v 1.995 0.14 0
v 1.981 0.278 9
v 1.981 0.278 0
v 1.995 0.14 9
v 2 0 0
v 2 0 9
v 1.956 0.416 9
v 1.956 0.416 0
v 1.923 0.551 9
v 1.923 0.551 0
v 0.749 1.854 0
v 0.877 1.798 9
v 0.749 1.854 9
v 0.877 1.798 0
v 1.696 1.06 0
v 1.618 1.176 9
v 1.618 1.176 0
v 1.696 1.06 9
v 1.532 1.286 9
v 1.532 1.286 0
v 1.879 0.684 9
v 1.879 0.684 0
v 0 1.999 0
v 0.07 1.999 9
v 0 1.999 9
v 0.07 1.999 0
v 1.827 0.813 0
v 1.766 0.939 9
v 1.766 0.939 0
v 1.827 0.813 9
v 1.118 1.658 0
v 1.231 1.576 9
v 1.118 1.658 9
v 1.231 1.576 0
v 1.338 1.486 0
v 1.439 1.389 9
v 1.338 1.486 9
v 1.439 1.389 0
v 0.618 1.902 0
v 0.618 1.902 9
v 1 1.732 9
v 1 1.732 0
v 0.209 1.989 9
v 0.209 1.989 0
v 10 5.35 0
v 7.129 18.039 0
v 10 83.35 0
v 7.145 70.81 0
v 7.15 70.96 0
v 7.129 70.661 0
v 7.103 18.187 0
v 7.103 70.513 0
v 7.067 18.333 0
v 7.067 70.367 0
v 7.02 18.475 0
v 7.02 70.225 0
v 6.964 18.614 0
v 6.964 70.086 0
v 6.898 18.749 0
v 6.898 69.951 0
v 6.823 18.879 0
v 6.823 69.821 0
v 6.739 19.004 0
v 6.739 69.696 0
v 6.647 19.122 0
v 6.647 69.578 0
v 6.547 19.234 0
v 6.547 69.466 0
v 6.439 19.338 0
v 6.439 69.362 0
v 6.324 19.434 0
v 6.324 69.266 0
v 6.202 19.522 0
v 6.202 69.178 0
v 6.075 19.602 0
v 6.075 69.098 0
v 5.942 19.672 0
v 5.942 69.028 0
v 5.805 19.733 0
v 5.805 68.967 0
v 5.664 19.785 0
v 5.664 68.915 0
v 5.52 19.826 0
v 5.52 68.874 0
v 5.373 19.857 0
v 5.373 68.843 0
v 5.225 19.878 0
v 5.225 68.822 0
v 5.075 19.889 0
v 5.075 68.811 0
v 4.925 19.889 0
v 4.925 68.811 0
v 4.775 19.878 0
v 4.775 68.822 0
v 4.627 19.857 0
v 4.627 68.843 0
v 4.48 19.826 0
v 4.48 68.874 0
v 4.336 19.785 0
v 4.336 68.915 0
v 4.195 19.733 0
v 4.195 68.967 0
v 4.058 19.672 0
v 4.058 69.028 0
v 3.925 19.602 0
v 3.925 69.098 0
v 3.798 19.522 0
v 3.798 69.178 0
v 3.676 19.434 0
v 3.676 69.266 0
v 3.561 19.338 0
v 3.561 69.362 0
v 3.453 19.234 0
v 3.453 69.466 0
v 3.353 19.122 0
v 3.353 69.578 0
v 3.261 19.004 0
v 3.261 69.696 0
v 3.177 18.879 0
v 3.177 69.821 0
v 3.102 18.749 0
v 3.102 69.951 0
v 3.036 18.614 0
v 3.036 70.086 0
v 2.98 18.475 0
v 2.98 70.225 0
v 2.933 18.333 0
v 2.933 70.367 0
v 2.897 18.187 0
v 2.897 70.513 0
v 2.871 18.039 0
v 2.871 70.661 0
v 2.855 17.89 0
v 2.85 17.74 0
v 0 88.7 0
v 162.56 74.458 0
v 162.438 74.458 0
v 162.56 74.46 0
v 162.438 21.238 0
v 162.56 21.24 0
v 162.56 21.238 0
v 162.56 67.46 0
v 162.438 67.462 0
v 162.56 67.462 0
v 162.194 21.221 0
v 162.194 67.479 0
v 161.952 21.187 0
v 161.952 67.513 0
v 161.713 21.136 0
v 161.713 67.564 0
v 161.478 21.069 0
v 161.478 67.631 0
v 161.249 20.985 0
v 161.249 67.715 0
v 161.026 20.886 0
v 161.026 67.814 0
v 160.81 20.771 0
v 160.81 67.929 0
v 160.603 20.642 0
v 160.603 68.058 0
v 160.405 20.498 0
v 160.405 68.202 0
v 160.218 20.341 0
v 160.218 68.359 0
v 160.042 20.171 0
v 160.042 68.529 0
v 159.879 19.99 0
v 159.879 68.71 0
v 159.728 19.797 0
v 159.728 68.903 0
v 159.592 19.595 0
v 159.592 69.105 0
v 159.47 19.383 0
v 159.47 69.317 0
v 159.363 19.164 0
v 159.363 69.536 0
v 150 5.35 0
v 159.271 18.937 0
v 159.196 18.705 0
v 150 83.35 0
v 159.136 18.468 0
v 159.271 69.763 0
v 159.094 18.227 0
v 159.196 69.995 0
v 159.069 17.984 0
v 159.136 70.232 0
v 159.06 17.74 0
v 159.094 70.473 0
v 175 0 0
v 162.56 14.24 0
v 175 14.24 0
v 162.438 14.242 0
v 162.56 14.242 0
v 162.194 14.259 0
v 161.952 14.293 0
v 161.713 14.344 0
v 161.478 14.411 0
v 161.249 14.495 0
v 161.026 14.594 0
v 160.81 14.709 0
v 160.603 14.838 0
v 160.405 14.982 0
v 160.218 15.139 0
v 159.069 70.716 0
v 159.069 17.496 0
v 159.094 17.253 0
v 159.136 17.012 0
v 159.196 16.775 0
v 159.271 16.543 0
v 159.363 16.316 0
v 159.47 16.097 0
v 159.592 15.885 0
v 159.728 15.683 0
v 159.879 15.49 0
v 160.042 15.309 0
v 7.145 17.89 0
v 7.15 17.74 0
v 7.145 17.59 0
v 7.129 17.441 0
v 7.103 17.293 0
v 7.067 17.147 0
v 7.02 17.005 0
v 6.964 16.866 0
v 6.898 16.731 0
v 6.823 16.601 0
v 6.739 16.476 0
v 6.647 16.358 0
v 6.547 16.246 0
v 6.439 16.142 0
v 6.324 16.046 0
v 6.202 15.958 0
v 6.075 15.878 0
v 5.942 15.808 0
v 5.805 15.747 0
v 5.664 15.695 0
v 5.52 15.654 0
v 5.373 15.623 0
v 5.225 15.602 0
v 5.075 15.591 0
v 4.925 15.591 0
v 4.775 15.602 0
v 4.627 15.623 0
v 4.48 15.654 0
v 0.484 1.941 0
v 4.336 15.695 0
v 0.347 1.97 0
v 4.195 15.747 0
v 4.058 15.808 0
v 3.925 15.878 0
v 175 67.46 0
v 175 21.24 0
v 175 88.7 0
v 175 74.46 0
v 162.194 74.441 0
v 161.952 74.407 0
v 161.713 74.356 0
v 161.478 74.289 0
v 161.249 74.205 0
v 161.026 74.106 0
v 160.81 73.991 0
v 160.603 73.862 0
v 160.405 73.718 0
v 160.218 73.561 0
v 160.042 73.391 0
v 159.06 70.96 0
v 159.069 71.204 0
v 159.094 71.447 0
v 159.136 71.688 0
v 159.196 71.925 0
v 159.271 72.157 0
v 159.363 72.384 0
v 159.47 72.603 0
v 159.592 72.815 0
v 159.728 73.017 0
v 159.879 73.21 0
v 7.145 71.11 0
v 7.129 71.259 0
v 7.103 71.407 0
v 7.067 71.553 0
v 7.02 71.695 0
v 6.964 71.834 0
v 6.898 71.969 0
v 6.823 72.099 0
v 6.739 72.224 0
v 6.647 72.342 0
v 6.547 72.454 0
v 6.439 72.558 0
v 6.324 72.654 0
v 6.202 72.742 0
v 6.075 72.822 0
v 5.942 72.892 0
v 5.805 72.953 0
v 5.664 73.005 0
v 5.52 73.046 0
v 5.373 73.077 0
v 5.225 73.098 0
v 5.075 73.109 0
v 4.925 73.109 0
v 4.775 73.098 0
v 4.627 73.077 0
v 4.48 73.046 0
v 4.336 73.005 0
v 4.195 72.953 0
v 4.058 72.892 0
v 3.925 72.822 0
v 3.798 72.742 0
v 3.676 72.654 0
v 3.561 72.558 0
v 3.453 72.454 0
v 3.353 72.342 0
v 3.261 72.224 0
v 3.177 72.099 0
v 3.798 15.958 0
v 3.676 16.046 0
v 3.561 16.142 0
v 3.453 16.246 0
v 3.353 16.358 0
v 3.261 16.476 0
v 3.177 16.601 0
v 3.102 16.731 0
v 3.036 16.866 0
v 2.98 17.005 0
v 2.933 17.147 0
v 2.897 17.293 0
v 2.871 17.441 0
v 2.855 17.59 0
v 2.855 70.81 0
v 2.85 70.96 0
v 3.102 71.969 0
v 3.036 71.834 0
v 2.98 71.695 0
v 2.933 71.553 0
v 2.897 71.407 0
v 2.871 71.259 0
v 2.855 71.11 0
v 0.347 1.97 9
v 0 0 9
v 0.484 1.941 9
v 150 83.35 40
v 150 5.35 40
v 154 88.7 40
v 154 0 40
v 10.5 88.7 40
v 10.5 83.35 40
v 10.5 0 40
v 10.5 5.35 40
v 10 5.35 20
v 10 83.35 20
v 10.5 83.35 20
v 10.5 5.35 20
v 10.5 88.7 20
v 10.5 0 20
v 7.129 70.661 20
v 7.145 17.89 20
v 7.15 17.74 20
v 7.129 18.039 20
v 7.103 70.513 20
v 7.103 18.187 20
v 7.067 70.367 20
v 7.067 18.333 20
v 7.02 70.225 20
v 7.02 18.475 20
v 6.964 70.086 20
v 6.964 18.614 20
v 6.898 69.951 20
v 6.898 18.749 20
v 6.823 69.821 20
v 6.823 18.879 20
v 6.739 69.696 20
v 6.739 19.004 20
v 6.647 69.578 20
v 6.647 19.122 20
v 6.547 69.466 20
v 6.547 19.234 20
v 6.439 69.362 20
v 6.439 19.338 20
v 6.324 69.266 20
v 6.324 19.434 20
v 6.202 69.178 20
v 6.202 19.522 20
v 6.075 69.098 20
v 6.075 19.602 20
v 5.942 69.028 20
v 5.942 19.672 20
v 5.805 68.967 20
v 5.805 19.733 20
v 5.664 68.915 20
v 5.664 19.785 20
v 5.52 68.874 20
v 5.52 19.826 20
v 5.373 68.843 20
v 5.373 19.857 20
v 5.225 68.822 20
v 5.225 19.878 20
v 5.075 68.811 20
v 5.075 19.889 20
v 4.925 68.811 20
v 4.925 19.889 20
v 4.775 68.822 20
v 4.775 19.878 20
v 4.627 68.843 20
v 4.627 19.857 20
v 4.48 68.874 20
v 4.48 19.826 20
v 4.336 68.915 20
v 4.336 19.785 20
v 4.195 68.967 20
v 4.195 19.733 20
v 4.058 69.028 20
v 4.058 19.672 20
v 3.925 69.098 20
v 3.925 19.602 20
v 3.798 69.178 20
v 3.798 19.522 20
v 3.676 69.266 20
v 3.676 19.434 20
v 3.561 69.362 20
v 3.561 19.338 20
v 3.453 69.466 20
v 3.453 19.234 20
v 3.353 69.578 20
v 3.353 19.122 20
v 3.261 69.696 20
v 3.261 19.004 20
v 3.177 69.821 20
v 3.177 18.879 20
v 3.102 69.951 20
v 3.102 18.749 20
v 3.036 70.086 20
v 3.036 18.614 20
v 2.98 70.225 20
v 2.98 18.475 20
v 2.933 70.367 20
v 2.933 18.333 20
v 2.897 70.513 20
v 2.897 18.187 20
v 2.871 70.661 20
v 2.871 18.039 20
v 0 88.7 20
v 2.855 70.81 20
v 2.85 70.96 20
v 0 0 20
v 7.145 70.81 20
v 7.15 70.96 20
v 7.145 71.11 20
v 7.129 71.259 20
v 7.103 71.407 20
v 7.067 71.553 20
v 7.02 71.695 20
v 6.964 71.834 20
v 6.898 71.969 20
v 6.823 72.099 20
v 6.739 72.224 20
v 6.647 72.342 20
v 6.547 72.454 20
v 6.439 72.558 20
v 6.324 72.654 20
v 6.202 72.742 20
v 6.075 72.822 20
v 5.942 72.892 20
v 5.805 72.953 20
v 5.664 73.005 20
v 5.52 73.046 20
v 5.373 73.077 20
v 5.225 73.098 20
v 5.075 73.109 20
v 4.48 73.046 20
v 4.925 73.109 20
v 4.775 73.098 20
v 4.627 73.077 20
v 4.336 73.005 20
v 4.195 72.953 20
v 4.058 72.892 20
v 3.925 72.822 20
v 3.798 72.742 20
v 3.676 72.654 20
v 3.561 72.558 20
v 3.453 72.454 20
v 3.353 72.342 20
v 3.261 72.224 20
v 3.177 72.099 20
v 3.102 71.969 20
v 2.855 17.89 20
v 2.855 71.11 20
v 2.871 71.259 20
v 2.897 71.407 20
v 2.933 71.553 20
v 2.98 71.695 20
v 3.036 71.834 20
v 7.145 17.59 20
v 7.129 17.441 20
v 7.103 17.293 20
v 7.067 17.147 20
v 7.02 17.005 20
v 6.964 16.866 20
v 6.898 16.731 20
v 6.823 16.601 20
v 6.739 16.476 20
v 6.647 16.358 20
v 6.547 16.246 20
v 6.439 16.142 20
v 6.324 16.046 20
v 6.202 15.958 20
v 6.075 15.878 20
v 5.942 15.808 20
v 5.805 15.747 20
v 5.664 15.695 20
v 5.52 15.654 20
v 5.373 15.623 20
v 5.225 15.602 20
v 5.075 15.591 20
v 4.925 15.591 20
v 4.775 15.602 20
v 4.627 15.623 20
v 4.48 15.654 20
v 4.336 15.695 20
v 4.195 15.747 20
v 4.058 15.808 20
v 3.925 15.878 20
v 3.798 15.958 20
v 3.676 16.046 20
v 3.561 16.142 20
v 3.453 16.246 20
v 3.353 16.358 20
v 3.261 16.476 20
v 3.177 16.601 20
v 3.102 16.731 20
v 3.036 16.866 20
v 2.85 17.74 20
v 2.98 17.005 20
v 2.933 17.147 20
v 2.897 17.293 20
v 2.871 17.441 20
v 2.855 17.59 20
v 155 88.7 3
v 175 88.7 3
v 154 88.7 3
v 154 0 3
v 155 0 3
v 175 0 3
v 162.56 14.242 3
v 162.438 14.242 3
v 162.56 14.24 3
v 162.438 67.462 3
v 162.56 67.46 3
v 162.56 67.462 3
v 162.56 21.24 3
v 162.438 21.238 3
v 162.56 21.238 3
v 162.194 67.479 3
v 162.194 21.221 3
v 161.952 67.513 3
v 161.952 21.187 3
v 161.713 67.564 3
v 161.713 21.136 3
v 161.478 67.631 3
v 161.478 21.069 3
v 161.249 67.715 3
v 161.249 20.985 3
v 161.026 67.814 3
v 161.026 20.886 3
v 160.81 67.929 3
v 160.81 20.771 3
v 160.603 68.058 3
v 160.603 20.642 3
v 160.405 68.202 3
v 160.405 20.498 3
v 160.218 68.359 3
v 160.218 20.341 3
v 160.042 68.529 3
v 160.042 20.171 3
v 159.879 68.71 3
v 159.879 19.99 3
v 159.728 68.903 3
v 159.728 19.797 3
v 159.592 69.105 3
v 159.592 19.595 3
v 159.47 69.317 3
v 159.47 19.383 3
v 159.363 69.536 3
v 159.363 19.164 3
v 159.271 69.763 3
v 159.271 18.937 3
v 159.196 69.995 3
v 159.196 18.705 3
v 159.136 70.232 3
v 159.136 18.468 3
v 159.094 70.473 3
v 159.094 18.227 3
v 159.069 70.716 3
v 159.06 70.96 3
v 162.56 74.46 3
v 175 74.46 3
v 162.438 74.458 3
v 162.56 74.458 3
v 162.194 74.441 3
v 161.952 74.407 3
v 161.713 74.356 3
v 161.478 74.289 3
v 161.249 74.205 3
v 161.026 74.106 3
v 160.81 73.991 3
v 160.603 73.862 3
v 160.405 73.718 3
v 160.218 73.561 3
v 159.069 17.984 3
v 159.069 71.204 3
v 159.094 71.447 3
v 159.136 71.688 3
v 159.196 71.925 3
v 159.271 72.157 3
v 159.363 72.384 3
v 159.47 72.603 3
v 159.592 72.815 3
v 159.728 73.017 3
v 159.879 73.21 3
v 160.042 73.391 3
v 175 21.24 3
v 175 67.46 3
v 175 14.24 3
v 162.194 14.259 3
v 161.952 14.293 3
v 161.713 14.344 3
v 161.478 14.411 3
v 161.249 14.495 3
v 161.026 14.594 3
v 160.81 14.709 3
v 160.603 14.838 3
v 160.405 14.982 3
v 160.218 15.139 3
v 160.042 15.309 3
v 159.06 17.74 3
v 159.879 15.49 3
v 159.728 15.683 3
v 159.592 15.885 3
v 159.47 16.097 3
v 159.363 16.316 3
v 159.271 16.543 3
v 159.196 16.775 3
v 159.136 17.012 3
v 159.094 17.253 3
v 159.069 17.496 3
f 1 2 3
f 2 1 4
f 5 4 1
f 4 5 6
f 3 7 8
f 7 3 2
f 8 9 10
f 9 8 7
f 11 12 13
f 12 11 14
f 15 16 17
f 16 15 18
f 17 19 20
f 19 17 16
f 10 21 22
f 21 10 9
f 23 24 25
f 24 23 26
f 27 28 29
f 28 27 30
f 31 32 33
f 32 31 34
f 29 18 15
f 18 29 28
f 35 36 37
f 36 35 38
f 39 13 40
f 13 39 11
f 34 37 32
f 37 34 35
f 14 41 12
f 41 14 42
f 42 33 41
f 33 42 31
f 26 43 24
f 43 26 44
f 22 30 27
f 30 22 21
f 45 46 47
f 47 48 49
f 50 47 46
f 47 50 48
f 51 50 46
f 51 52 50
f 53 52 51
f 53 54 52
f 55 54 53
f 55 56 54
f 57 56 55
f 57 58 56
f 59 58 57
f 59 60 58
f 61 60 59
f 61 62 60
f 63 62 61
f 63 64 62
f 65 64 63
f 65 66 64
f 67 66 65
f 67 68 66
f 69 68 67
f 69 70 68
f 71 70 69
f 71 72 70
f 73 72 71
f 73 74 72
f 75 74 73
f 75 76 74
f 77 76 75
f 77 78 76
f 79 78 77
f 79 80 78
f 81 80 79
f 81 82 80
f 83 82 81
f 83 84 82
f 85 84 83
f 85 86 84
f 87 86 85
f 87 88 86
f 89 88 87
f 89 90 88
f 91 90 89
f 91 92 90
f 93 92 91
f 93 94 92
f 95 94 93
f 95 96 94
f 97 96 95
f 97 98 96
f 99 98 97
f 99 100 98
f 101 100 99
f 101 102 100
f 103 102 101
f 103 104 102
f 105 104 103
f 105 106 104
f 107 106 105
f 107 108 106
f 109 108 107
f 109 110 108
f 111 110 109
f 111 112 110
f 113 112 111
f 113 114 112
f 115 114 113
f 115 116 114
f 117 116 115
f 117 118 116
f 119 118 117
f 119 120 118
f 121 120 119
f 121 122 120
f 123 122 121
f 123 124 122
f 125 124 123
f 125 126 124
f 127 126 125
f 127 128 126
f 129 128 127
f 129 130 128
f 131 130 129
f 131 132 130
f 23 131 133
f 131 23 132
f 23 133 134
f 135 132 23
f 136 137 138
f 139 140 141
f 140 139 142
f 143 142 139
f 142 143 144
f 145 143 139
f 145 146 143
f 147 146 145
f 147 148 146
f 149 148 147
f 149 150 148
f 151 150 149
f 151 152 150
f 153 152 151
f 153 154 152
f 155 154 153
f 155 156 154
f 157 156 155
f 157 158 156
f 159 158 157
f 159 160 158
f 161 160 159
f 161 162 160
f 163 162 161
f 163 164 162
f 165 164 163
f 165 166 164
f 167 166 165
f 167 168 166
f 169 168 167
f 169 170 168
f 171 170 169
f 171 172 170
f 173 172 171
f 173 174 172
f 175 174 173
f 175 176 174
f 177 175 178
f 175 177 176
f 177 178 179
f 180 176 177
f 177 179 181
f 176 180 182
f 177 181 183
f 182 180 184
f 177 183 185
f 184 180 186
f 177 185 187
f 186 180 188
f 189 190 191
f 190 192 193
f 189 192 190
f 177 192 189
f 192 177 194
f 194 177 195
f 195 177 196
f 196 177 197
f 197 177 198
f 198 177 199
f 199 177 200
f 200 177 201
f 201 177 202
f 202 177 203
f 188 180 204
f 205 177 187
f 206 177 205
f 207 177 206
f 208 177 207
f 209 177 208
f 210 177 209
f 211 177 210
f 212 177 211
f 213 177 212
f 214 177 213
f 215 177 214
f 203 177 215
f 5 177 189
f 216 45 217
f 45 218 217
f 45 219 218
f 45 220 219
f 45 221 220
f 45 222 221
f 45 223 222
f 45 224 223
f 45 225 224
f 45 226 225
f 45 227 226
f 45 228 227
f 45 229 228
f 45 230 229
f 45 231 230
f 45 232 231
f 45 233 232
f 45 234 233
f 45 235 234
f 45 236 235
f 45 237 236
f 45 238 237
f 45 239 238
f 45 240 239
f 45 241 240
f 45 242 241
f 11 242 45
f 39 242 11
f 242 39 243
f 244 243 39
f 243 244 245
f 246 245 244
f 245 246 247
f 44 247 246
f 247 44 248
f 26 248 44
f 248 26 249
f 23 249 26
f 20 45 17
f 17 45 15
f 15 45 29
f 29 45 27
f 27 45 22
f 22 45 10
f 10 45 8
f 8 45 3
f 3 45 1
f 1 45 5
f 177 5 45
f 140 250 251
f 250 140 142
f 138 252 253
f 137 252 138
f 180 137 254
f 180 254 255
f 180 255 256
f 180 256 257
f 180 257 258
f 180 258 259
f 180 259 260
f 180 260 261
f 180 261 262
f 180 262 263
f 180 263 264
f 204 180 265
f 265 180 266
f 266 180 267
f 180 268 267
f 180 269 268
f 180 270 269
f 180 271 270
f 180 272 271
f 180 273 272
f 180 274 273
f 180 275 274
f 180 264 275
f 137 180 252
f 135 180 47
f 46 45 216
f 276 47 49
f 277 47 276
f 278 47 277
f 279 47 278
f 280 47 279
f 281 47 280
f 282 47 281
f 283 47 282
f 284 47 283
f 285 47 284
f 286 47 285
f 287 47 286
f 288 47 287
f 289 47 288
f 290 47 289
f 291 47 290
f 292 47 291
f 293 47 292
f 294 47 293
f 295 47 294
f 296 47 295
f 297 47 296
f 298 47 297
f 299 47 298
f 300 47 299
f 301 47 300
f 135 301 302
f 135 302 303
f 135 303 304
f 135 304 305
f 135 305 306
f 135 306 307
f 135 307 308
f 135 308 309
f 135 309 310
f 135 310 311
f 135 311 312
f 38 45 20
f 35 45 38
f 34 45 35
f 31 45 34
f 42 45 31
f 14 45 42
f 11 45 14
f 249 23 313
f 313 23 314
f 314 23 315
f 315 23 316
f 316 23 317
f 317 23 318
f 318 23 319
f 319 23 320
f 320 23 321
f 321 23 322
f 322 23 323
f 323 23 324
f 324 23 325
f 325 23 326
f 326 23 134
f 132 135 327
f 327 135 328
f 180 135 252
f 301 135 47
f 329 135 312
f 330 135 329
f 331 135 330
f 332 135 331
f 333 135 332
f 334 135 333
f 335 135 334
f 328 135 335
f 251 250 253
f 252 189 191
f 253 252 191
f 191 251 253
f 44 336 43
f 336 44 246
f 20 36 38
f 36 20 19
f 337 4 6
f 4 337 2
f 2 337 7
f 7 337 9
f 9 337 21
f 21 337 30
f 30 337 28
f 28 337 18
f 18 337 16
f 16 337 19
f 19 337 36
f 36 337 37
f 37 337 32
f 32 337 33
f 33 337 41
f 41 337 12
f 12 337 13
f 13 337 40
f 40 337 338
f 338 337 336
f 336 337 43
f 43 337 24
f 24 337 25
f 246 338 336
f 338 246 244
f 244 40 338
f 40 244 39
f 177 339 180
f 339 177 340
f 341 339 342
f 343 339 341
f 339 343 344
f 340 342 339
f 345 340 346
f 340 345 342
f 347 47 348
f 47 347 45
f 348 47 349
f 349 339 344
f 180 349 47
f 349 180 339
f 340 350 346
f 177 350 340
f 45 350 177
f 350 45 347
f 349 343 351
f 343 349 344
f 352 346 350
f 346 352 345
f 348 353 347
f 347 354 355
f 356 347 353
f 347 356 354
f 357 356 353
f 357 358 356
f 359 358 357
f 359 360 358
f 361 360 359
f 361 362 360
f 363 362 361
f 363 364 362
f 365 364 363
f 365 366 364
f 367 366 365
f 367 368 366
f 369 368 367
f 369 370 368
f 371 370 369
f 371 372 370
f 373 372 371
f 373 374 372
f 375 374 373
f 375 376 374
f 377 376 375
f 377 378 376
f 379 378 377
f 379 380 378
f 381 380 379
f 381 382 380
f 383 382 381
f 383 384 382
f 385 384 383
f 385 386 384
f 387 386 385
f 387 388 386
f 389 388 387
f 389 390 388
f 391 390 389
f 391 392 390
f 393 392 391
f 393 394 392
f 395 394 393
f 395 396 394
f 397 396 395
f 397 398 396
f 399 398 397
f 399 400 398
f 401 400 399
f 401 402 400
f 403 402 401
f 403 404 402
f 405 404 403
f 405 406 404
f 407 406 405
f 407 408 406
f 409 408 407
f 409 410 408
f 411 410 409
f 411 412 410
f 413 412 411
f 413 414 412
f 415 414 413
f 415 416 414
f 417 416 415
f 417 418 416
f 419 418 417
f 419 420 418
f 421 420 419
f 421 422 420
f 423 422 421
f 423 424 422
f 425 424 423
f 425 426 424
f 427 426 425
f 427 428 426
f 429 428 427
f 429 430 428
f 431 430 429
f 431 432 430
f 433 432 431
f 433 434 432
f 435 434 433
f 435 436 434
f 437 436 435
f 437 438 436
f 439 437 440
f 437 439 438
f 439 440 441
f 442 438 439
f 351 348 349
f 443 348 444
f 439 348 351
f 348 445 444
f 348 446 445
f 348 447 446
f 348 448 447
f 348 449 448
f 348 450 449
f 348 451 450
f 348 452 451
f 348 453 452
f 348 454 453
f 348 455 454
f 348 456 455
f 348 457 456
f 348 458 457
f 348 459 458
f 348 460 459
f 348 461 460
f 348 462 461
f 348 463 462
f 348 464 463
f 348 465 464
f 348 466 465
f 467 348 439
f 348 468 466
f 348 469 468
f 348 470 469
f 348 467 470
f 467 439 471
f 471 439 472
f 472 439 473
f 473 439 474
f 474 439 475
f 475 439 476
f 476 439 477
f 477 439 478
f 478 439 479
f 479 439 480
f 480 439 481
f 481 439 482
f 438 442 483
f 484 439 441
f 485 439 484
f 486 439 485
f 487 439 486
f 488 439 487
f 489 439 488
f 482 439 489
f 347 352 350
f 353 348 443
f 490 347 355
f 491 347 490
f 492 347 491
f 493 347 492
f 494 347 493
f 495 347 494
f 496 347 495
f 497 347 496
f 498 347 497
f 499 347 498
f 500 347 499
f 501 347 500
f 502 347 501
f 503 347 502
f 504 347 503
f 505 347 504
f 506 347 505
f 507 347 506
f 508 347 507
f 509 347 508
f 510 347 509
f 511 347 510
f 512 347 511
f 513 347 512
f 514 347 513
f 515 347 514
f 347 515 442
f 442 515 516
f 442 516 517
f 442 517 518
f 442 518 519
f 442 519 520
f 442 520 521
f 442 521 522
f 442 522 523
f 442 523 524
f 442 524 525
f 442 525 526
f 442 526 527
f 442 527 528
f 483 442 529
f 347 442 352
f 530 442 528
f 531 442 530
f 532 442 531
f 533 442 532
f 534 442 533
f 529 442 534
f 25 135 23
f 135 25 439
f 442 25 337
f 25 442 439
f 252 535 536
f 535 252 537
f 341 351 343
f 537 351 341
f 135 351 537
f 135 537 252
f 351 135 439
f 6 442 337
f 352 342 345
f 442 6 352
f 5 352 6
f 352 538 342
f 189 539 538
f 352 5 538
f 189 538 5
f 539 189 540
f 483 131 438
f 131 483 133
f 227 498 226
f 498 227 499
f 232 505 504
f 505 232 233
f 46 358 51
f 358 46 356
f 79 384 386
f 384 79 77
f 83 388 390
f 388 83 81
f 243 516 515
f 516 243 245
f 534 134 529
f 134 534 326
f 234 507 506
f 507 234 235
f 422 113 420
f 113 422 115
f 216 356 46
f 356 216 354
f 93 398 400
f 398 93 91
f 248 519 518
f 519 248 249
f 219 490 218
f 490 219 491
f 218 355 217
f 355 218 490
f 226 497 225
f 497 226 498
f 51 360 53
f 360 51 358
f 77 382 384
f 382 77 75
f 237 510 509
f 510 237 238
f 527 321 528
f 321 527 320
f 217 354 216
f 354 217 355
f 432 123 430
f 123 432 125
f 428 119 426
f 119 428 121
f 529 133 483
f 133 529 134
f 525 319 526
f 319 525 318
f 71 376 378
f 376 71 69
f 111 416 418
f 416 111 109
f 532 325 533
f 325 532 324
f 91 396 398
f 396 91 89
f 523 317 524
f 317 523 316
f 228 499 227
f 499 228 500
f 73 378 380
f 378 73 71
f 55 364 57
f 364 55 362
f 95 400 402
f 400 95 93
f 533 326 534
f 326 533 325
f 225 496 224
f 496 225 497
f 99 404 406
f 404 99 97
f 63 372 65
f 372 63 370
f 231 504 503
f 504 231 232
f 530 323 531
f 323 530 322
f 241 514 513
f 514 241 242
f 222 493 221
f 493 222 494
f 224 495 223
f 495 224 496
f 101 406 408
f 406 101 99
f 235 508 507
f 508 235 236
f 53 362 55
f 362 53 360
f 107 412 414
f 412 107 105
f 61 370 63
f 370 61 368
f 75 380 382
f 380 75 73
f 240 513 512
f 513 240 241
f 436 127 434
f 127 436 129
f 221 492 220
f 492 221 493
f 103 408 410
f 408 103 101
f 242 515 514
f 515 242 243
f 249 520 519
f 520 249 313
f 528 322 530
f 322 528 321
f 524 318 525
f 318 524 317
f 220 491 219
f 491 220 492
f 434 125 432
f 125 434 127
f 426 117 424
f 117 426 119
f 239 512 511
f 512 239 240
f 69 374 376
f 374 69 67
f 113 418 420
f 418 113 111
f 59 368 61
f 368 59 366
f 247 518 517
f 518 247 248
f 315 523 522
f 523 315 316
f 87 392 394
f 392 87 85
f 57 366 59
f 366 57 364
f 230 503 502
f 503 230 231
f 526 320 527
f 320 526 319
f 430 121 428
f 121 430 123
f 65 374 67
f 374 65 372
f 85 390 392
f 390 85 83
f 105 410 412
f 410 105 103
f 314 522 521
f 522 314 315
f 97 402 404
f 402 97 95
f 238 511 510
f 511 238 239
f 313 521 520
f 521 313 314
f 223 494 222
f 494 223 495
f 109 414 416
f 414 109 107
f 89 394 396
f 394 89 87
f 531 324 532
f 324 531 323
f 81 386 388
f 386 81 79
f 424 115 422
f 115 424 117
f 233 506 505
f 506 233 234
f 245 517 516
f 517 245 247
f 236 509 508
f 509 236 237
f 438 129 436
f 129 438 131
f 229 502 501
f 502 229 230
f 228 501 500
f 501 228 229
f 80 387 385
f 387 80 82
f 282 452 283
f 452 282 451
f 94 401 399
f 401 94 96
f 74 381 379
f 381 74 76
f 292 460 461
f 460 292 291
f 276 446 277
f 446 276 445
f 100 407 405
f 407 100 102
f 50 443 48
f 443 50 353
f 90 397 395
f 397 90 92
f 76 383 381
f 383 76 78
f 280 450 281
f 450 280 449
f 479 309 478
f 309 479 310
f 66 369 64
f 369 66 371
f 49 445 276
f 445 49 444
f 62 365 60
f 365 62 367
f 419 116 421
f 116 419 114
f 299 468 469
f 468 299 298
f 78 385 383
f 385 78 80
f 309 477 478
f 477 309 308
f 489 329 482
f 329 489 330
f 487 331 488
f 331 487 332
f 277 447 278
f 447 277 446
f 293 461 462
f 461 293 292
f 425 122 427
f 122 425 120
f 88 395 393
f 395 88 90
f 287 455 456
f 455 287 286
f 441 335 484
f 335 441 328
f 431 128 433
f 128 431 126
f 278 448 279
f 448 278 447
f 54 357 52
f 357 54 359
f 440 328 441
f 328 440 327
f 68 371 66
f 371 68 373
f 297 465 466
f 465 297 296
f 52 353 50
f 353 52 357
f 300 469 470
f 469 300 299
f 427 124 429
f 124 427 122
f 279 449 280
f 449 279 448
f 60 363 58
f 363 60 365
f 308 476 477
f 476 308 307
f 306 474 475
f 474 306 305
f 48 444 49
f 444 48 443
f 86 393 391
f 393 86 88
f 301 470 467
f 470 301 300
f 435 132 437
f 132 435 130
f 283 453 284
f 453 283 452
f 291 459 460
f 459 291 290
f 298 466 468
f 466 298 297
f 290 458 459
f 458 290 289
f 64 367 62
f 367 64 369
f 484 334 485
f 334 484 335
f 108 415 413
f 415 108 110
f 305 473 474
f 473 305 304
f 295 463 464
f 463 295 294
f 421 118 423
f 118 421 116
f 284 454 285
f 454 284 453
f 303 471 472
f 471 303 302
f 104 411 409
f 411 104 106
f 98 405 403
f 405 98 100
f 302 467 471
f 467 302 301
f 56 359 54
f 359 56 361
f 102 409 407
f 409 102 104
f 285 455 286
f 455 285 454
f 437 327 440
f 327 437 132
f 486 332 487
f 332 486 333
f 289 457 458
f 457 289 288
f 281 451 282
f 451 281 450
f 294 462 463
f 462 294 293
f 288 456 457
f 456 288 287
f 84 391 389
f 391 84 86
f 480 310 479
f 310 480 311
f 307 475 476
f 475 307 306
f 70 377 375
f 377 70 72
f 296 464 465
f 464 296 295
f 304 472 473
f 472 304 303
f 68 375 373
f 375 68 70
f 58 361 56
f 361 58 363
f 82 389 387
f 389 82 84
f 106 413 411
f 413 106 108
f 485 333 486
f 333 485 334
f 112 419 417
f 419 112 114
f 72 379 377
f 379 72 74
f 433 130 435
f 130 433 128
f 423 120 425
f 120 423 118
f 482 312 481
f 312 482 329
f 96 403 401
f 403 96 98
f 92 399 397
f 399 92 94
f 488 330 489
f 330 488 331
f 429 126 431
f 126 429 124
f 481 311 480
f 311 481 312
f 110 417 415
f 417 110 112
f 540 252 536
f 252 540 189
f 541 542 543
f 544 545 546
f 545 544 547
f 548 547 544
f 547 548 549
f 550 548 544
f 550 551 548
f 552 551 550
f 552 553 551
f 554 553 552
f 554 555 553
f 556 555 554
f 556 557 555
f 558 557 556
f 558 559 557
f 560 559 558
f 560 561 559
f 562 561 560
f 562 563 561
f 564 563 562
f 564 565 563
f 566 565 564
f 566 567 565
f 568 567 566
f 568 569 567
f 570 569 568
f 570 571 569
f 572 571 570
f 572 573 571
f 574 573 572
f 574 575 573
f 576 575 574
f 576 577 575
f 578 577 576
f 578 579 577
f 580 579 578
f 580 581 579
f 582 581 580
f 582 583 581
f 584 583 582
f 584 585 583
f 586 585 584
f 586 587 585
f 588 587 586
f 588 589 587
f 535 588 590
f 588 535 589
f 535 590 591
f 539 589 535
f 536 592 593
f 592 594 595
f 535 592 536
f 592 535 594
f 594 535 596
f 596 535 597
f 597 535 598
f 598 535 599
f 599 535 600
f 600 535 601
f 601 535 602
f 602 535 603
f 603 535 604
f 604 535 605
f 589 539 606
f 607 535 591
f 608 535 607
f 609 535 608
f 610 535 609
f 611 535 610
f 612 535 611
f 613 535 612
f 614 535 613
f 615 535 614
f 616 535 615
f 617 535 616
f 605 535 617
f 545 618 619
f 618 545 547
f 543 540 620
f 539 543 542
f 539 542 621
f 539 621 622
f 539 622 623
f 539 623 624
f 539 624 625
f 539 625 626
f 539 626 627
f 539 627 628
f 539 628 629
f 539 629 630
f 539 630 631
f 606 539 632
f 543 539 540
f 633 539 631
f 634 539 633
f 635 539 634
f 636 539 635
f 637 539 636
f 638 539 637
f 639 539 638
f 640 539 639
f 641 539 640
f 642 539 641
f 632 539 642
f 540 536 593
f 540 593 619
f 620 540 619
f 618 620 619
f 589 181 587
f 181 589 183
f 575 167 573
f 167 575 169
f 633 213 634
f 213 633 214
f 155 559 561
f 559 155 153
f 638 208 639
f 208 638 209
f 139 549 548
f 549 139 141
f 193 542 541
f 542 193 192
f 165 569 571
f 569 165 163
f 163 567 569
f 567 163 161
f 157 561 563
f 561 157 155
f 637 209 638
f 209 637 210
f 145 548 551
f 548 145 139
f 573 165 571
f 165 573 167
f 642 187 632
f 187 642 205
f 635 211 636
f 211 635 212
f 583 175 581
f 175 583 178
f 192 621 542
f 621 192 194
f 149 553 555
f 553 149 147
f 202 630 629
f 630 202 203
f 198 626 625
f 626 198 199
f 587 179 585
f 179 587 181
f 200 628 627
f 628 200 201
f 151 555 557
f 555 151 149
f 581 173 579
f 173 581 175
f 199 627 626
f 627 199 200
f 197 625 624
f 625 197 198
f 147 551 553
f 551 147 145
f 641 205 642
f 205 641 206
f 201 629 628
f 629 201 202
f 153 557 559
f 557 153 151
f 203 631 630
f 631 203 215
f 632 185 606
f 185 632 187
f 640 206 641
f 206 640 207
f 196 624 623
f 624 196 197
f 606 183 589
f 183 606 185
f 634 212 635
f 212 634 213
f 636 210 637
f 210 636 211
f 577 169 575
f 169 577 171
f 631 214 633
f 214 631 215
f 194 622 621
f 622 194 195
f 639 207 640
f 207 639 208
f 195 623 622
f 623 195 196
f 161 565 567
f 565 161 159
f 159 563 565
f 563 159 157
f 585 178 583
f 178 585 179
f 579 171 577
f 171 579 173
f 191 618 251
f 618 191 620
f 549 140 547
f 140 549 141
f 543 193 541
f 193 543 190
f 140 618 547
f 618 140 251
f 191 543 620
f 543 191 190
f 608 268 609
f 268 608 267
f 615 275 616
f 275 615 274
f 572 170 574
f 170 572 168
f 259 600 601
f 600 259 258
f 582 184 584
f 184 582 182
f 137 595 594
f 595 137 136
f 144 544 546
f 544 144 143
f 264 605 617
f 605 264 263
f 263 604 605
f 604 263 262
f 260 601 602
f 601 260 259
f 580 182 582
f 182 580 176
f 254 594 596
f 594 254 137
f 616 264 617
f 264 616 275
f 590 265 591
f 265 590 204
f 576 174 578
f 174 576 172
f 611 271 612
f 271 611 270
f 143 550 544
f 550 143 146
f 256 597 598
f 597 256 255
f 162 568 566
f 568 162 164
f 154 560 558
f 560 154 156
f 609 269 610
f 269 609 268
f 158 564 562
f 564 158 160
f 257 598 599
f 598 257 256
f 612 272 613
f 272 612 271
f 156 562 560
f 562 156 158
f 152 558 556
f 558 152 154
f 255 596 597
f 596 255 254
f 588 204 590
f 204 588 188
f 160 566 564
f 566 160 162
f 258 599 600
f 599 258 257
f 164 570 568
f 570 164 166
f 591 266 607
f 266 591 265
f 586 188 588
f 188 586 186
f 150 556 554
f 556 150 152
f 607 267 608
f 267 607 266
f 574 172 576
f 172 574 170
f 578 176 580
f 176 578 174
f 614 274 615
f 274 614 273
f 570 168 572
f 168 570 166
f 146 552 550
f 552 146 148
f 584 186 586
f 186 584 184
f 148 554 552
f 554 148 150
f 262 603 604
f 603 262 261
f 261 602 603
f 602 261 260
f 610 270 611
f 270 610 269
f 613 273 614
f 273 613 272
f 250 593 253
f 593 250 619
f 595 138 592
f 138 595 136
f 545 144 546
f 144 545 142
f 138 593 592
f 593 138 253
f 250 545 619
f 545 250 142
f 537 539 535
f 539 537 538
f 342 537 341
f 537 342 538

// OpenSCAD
// file: ../utils/server-rack-node-case/case-generic.scad
/* caseGeneric
    Used by `caseSide` and `caseMiddle` to generate 
    a basic case with monting holes, e.g., for ssd or Pi.

    cwi: case width inner
    cwo: case width outer
    chi: case height inner
    cho: case height outer
    cdt: case depth thickenss
    npc: node per case
    dbnh: distance between node holes
    isSide: 
*/
module caseGeneric(cwi,cwo,chi,cho,cdt,npc,dbnh, isSide=true){
    nt = cwi/npc;  // Node thicknes

    hwt = (cho-chi)/2; // horizontal wall thickness
    vwt = (cwo-cwi)/2; // vertical wall thickness
    vwtt = vwt*2; // vertical wall thickness total
    cwt = cwo+vwt*2; // case width total
    dnmh = 4; // diameter node mounting hole
    hnmh = 9; // height node mounting hole
    dcmh = 4.3; // diameter case mounting hole
    mcc = 0.5; // margin for connecting cases

    module nodeMountingHoles(){
        for(i=[1:2:npc*2]){
            // Buttom holes
            translate([vwtt+(nt/2)*i,(cho-dbnh)/2,0])
            cylinder(d=dnmh, h=hnmh);

            // Top holes 
            translate([vwtt+(nt/2)*i,(cho+dbnh)/2,0])
            cylinder(d=dnmh, h=hnmh);
        }
    }
    
    difference(){
        union(){
            if (isSide)
            {
              cube([cwt-vwt,cho,cdt]);
            }
            else
            {
              cube([cwt,cho,cdt]);
            }
        }
        union(){
            // Inner cutout
            translate([vwtt,hwt,0])
            cube([cwi,chi,cdt]);
            
            // Cutout for connecting cases
            translate([0,0,cdt/2])
            cube([vwtt+mcc,cho,cdt/2]);

            translate([vwt,cho/5,0])
            cylinder(d=dcmh, h=cdt);
            translate([vwt,cho/5*4,0])
            cylinder(d=dcmh, h=cdt);

            if (isSide)
            {
                nodeMountingHoles();
            }
            else
            {
                translate([0,0,cdt-hnmh])
                nodeMountingHoles();

                translate([cwo-mcc,0,cdt/2])
                cube([vwtt+mcc,cho,cdt/2]);

                translate([cwt-vwt,cho/5,0])
                cylinder(d=dcmh, h=cdt);
                translate([cwt-vwt,cho/5*4,0])
                cylinder(d=dcmh, h=cdt);
            }
        }
    }
}
// file: ../utils/server-rack-node-case/case-side.scad
use <case-generic.scad>;

/* caseSide
    case with have rack mounts. One on eatch side

    cwi: case width inner
    cwo: case width outer
    chi: case height inner
    cho: case height outer
    cdt: case depth thickenss
    npc: node per case
*/
module caseSide(cwi,cwo,chi,cho,cdt,npc){
    cst = (cwo-cwi)/2; // case side thickness
    csw = 20; // case side mount width
    csmt = 3; // case side mount thickness
    dfcetmh = 7.56; // distance from case end to mounting hole
    
    s = 1;
    s2 = s*2;

    hds = 7; // hole diameter for serer rack

    module serverMountingHoles() {
        #cylinder(h=csmt,d=hds);
        translate([0,-hds/2,0])
        #cube([csw-7.56,hds,csmt]);
    }

    difference(){
        union(){
            caseGeneric(cwi,cwo,chi,cho,cdt,npc, true);

            translate([cwo+cst,0,0])
            cube([csw,cho,csmt]);
        }
        union(){
            translate([cwo+cst+dfcetmh,cho/5,0]) // TODO: change to correct possition
            serverMountingHoles();
            translate([cwo+cst+dfcetmh,cho/5*4,0]) // TODO: change to correct possition
            serverMountingHoles();

            // Remove 1mm to allow some margin
            translate([cwo+cst-1,0,csmt])
            cube([1,cho,cdt-csmt]);
        }
    }
}
// file: ../utils/constants.scad
$fn=90;  // accuracy

/* Server dimentions */

// one server unit
c_1u = 44.45;  

// two server unit
c_2u = c_1u*2; // 88.9

// total width
// The total with of the a server rack (19")
// this includes the mounting holes
c_tw  = 482.6; 

// Total inner width
// The distance between the mounting holes in the server rack
c_tiw = 450;


/* Rack hole dimentions */

// width distance rack holes
c_wdrh = 465;

// height distance rack holes
c_hdrh = 33;


/* dell optiplex 7040 micro usff dimentions */

// dell optiplex 7040 height
c_do7040h = 36;

// dell optiplex 7040 width
c_do7040w = 182;

// dell optiplex 7040 depth
c_do7040d = 179;

// dell optiplex 7040 rubber feet width distance
c_do7040rfwd = 14.9;

// dell optiplex 7040 rubber feet back depth distance
c_do7040rfbdd = 9.9;


/* Case dimentions */

// case height outer 
// A small margin is included to so that the case does not 
// exide two server units
c_2ucho = c_2u-0.2; 

// case height inner
// The thickness of the walls can then be calculated as (cho-chi)/2
c_2uchi = 78;

// case width outer
// as there are three parts of the rack server case we just devide
// the total inner width with three 
c_cwo = c_tiw/3; // 150

// case width inner
// Needs to be less than case width outer
c_cwi = 140;

// case depth thickness
// How thick the case should be. It needs to be thicker than the hight
// of the threaded insert.
c_cdt = 40;

// case inner side thickness
// The middle and the side case over lap so that a screw can be entered
// between the two cases. The cist is defined as the thickness of the part
// that does not overlap between the midle and side case.
c_cist = 3.5;

// nodes per case
c_npc = 7;
// main file
include <../utils/constants.scad>;
use <../utils/server-rack-node-case/case-side.scad>;

caseSide(c_cwi,c_cwo,c_2uchi,c_2ucho,c_cdt,c_cist,c_npc);
